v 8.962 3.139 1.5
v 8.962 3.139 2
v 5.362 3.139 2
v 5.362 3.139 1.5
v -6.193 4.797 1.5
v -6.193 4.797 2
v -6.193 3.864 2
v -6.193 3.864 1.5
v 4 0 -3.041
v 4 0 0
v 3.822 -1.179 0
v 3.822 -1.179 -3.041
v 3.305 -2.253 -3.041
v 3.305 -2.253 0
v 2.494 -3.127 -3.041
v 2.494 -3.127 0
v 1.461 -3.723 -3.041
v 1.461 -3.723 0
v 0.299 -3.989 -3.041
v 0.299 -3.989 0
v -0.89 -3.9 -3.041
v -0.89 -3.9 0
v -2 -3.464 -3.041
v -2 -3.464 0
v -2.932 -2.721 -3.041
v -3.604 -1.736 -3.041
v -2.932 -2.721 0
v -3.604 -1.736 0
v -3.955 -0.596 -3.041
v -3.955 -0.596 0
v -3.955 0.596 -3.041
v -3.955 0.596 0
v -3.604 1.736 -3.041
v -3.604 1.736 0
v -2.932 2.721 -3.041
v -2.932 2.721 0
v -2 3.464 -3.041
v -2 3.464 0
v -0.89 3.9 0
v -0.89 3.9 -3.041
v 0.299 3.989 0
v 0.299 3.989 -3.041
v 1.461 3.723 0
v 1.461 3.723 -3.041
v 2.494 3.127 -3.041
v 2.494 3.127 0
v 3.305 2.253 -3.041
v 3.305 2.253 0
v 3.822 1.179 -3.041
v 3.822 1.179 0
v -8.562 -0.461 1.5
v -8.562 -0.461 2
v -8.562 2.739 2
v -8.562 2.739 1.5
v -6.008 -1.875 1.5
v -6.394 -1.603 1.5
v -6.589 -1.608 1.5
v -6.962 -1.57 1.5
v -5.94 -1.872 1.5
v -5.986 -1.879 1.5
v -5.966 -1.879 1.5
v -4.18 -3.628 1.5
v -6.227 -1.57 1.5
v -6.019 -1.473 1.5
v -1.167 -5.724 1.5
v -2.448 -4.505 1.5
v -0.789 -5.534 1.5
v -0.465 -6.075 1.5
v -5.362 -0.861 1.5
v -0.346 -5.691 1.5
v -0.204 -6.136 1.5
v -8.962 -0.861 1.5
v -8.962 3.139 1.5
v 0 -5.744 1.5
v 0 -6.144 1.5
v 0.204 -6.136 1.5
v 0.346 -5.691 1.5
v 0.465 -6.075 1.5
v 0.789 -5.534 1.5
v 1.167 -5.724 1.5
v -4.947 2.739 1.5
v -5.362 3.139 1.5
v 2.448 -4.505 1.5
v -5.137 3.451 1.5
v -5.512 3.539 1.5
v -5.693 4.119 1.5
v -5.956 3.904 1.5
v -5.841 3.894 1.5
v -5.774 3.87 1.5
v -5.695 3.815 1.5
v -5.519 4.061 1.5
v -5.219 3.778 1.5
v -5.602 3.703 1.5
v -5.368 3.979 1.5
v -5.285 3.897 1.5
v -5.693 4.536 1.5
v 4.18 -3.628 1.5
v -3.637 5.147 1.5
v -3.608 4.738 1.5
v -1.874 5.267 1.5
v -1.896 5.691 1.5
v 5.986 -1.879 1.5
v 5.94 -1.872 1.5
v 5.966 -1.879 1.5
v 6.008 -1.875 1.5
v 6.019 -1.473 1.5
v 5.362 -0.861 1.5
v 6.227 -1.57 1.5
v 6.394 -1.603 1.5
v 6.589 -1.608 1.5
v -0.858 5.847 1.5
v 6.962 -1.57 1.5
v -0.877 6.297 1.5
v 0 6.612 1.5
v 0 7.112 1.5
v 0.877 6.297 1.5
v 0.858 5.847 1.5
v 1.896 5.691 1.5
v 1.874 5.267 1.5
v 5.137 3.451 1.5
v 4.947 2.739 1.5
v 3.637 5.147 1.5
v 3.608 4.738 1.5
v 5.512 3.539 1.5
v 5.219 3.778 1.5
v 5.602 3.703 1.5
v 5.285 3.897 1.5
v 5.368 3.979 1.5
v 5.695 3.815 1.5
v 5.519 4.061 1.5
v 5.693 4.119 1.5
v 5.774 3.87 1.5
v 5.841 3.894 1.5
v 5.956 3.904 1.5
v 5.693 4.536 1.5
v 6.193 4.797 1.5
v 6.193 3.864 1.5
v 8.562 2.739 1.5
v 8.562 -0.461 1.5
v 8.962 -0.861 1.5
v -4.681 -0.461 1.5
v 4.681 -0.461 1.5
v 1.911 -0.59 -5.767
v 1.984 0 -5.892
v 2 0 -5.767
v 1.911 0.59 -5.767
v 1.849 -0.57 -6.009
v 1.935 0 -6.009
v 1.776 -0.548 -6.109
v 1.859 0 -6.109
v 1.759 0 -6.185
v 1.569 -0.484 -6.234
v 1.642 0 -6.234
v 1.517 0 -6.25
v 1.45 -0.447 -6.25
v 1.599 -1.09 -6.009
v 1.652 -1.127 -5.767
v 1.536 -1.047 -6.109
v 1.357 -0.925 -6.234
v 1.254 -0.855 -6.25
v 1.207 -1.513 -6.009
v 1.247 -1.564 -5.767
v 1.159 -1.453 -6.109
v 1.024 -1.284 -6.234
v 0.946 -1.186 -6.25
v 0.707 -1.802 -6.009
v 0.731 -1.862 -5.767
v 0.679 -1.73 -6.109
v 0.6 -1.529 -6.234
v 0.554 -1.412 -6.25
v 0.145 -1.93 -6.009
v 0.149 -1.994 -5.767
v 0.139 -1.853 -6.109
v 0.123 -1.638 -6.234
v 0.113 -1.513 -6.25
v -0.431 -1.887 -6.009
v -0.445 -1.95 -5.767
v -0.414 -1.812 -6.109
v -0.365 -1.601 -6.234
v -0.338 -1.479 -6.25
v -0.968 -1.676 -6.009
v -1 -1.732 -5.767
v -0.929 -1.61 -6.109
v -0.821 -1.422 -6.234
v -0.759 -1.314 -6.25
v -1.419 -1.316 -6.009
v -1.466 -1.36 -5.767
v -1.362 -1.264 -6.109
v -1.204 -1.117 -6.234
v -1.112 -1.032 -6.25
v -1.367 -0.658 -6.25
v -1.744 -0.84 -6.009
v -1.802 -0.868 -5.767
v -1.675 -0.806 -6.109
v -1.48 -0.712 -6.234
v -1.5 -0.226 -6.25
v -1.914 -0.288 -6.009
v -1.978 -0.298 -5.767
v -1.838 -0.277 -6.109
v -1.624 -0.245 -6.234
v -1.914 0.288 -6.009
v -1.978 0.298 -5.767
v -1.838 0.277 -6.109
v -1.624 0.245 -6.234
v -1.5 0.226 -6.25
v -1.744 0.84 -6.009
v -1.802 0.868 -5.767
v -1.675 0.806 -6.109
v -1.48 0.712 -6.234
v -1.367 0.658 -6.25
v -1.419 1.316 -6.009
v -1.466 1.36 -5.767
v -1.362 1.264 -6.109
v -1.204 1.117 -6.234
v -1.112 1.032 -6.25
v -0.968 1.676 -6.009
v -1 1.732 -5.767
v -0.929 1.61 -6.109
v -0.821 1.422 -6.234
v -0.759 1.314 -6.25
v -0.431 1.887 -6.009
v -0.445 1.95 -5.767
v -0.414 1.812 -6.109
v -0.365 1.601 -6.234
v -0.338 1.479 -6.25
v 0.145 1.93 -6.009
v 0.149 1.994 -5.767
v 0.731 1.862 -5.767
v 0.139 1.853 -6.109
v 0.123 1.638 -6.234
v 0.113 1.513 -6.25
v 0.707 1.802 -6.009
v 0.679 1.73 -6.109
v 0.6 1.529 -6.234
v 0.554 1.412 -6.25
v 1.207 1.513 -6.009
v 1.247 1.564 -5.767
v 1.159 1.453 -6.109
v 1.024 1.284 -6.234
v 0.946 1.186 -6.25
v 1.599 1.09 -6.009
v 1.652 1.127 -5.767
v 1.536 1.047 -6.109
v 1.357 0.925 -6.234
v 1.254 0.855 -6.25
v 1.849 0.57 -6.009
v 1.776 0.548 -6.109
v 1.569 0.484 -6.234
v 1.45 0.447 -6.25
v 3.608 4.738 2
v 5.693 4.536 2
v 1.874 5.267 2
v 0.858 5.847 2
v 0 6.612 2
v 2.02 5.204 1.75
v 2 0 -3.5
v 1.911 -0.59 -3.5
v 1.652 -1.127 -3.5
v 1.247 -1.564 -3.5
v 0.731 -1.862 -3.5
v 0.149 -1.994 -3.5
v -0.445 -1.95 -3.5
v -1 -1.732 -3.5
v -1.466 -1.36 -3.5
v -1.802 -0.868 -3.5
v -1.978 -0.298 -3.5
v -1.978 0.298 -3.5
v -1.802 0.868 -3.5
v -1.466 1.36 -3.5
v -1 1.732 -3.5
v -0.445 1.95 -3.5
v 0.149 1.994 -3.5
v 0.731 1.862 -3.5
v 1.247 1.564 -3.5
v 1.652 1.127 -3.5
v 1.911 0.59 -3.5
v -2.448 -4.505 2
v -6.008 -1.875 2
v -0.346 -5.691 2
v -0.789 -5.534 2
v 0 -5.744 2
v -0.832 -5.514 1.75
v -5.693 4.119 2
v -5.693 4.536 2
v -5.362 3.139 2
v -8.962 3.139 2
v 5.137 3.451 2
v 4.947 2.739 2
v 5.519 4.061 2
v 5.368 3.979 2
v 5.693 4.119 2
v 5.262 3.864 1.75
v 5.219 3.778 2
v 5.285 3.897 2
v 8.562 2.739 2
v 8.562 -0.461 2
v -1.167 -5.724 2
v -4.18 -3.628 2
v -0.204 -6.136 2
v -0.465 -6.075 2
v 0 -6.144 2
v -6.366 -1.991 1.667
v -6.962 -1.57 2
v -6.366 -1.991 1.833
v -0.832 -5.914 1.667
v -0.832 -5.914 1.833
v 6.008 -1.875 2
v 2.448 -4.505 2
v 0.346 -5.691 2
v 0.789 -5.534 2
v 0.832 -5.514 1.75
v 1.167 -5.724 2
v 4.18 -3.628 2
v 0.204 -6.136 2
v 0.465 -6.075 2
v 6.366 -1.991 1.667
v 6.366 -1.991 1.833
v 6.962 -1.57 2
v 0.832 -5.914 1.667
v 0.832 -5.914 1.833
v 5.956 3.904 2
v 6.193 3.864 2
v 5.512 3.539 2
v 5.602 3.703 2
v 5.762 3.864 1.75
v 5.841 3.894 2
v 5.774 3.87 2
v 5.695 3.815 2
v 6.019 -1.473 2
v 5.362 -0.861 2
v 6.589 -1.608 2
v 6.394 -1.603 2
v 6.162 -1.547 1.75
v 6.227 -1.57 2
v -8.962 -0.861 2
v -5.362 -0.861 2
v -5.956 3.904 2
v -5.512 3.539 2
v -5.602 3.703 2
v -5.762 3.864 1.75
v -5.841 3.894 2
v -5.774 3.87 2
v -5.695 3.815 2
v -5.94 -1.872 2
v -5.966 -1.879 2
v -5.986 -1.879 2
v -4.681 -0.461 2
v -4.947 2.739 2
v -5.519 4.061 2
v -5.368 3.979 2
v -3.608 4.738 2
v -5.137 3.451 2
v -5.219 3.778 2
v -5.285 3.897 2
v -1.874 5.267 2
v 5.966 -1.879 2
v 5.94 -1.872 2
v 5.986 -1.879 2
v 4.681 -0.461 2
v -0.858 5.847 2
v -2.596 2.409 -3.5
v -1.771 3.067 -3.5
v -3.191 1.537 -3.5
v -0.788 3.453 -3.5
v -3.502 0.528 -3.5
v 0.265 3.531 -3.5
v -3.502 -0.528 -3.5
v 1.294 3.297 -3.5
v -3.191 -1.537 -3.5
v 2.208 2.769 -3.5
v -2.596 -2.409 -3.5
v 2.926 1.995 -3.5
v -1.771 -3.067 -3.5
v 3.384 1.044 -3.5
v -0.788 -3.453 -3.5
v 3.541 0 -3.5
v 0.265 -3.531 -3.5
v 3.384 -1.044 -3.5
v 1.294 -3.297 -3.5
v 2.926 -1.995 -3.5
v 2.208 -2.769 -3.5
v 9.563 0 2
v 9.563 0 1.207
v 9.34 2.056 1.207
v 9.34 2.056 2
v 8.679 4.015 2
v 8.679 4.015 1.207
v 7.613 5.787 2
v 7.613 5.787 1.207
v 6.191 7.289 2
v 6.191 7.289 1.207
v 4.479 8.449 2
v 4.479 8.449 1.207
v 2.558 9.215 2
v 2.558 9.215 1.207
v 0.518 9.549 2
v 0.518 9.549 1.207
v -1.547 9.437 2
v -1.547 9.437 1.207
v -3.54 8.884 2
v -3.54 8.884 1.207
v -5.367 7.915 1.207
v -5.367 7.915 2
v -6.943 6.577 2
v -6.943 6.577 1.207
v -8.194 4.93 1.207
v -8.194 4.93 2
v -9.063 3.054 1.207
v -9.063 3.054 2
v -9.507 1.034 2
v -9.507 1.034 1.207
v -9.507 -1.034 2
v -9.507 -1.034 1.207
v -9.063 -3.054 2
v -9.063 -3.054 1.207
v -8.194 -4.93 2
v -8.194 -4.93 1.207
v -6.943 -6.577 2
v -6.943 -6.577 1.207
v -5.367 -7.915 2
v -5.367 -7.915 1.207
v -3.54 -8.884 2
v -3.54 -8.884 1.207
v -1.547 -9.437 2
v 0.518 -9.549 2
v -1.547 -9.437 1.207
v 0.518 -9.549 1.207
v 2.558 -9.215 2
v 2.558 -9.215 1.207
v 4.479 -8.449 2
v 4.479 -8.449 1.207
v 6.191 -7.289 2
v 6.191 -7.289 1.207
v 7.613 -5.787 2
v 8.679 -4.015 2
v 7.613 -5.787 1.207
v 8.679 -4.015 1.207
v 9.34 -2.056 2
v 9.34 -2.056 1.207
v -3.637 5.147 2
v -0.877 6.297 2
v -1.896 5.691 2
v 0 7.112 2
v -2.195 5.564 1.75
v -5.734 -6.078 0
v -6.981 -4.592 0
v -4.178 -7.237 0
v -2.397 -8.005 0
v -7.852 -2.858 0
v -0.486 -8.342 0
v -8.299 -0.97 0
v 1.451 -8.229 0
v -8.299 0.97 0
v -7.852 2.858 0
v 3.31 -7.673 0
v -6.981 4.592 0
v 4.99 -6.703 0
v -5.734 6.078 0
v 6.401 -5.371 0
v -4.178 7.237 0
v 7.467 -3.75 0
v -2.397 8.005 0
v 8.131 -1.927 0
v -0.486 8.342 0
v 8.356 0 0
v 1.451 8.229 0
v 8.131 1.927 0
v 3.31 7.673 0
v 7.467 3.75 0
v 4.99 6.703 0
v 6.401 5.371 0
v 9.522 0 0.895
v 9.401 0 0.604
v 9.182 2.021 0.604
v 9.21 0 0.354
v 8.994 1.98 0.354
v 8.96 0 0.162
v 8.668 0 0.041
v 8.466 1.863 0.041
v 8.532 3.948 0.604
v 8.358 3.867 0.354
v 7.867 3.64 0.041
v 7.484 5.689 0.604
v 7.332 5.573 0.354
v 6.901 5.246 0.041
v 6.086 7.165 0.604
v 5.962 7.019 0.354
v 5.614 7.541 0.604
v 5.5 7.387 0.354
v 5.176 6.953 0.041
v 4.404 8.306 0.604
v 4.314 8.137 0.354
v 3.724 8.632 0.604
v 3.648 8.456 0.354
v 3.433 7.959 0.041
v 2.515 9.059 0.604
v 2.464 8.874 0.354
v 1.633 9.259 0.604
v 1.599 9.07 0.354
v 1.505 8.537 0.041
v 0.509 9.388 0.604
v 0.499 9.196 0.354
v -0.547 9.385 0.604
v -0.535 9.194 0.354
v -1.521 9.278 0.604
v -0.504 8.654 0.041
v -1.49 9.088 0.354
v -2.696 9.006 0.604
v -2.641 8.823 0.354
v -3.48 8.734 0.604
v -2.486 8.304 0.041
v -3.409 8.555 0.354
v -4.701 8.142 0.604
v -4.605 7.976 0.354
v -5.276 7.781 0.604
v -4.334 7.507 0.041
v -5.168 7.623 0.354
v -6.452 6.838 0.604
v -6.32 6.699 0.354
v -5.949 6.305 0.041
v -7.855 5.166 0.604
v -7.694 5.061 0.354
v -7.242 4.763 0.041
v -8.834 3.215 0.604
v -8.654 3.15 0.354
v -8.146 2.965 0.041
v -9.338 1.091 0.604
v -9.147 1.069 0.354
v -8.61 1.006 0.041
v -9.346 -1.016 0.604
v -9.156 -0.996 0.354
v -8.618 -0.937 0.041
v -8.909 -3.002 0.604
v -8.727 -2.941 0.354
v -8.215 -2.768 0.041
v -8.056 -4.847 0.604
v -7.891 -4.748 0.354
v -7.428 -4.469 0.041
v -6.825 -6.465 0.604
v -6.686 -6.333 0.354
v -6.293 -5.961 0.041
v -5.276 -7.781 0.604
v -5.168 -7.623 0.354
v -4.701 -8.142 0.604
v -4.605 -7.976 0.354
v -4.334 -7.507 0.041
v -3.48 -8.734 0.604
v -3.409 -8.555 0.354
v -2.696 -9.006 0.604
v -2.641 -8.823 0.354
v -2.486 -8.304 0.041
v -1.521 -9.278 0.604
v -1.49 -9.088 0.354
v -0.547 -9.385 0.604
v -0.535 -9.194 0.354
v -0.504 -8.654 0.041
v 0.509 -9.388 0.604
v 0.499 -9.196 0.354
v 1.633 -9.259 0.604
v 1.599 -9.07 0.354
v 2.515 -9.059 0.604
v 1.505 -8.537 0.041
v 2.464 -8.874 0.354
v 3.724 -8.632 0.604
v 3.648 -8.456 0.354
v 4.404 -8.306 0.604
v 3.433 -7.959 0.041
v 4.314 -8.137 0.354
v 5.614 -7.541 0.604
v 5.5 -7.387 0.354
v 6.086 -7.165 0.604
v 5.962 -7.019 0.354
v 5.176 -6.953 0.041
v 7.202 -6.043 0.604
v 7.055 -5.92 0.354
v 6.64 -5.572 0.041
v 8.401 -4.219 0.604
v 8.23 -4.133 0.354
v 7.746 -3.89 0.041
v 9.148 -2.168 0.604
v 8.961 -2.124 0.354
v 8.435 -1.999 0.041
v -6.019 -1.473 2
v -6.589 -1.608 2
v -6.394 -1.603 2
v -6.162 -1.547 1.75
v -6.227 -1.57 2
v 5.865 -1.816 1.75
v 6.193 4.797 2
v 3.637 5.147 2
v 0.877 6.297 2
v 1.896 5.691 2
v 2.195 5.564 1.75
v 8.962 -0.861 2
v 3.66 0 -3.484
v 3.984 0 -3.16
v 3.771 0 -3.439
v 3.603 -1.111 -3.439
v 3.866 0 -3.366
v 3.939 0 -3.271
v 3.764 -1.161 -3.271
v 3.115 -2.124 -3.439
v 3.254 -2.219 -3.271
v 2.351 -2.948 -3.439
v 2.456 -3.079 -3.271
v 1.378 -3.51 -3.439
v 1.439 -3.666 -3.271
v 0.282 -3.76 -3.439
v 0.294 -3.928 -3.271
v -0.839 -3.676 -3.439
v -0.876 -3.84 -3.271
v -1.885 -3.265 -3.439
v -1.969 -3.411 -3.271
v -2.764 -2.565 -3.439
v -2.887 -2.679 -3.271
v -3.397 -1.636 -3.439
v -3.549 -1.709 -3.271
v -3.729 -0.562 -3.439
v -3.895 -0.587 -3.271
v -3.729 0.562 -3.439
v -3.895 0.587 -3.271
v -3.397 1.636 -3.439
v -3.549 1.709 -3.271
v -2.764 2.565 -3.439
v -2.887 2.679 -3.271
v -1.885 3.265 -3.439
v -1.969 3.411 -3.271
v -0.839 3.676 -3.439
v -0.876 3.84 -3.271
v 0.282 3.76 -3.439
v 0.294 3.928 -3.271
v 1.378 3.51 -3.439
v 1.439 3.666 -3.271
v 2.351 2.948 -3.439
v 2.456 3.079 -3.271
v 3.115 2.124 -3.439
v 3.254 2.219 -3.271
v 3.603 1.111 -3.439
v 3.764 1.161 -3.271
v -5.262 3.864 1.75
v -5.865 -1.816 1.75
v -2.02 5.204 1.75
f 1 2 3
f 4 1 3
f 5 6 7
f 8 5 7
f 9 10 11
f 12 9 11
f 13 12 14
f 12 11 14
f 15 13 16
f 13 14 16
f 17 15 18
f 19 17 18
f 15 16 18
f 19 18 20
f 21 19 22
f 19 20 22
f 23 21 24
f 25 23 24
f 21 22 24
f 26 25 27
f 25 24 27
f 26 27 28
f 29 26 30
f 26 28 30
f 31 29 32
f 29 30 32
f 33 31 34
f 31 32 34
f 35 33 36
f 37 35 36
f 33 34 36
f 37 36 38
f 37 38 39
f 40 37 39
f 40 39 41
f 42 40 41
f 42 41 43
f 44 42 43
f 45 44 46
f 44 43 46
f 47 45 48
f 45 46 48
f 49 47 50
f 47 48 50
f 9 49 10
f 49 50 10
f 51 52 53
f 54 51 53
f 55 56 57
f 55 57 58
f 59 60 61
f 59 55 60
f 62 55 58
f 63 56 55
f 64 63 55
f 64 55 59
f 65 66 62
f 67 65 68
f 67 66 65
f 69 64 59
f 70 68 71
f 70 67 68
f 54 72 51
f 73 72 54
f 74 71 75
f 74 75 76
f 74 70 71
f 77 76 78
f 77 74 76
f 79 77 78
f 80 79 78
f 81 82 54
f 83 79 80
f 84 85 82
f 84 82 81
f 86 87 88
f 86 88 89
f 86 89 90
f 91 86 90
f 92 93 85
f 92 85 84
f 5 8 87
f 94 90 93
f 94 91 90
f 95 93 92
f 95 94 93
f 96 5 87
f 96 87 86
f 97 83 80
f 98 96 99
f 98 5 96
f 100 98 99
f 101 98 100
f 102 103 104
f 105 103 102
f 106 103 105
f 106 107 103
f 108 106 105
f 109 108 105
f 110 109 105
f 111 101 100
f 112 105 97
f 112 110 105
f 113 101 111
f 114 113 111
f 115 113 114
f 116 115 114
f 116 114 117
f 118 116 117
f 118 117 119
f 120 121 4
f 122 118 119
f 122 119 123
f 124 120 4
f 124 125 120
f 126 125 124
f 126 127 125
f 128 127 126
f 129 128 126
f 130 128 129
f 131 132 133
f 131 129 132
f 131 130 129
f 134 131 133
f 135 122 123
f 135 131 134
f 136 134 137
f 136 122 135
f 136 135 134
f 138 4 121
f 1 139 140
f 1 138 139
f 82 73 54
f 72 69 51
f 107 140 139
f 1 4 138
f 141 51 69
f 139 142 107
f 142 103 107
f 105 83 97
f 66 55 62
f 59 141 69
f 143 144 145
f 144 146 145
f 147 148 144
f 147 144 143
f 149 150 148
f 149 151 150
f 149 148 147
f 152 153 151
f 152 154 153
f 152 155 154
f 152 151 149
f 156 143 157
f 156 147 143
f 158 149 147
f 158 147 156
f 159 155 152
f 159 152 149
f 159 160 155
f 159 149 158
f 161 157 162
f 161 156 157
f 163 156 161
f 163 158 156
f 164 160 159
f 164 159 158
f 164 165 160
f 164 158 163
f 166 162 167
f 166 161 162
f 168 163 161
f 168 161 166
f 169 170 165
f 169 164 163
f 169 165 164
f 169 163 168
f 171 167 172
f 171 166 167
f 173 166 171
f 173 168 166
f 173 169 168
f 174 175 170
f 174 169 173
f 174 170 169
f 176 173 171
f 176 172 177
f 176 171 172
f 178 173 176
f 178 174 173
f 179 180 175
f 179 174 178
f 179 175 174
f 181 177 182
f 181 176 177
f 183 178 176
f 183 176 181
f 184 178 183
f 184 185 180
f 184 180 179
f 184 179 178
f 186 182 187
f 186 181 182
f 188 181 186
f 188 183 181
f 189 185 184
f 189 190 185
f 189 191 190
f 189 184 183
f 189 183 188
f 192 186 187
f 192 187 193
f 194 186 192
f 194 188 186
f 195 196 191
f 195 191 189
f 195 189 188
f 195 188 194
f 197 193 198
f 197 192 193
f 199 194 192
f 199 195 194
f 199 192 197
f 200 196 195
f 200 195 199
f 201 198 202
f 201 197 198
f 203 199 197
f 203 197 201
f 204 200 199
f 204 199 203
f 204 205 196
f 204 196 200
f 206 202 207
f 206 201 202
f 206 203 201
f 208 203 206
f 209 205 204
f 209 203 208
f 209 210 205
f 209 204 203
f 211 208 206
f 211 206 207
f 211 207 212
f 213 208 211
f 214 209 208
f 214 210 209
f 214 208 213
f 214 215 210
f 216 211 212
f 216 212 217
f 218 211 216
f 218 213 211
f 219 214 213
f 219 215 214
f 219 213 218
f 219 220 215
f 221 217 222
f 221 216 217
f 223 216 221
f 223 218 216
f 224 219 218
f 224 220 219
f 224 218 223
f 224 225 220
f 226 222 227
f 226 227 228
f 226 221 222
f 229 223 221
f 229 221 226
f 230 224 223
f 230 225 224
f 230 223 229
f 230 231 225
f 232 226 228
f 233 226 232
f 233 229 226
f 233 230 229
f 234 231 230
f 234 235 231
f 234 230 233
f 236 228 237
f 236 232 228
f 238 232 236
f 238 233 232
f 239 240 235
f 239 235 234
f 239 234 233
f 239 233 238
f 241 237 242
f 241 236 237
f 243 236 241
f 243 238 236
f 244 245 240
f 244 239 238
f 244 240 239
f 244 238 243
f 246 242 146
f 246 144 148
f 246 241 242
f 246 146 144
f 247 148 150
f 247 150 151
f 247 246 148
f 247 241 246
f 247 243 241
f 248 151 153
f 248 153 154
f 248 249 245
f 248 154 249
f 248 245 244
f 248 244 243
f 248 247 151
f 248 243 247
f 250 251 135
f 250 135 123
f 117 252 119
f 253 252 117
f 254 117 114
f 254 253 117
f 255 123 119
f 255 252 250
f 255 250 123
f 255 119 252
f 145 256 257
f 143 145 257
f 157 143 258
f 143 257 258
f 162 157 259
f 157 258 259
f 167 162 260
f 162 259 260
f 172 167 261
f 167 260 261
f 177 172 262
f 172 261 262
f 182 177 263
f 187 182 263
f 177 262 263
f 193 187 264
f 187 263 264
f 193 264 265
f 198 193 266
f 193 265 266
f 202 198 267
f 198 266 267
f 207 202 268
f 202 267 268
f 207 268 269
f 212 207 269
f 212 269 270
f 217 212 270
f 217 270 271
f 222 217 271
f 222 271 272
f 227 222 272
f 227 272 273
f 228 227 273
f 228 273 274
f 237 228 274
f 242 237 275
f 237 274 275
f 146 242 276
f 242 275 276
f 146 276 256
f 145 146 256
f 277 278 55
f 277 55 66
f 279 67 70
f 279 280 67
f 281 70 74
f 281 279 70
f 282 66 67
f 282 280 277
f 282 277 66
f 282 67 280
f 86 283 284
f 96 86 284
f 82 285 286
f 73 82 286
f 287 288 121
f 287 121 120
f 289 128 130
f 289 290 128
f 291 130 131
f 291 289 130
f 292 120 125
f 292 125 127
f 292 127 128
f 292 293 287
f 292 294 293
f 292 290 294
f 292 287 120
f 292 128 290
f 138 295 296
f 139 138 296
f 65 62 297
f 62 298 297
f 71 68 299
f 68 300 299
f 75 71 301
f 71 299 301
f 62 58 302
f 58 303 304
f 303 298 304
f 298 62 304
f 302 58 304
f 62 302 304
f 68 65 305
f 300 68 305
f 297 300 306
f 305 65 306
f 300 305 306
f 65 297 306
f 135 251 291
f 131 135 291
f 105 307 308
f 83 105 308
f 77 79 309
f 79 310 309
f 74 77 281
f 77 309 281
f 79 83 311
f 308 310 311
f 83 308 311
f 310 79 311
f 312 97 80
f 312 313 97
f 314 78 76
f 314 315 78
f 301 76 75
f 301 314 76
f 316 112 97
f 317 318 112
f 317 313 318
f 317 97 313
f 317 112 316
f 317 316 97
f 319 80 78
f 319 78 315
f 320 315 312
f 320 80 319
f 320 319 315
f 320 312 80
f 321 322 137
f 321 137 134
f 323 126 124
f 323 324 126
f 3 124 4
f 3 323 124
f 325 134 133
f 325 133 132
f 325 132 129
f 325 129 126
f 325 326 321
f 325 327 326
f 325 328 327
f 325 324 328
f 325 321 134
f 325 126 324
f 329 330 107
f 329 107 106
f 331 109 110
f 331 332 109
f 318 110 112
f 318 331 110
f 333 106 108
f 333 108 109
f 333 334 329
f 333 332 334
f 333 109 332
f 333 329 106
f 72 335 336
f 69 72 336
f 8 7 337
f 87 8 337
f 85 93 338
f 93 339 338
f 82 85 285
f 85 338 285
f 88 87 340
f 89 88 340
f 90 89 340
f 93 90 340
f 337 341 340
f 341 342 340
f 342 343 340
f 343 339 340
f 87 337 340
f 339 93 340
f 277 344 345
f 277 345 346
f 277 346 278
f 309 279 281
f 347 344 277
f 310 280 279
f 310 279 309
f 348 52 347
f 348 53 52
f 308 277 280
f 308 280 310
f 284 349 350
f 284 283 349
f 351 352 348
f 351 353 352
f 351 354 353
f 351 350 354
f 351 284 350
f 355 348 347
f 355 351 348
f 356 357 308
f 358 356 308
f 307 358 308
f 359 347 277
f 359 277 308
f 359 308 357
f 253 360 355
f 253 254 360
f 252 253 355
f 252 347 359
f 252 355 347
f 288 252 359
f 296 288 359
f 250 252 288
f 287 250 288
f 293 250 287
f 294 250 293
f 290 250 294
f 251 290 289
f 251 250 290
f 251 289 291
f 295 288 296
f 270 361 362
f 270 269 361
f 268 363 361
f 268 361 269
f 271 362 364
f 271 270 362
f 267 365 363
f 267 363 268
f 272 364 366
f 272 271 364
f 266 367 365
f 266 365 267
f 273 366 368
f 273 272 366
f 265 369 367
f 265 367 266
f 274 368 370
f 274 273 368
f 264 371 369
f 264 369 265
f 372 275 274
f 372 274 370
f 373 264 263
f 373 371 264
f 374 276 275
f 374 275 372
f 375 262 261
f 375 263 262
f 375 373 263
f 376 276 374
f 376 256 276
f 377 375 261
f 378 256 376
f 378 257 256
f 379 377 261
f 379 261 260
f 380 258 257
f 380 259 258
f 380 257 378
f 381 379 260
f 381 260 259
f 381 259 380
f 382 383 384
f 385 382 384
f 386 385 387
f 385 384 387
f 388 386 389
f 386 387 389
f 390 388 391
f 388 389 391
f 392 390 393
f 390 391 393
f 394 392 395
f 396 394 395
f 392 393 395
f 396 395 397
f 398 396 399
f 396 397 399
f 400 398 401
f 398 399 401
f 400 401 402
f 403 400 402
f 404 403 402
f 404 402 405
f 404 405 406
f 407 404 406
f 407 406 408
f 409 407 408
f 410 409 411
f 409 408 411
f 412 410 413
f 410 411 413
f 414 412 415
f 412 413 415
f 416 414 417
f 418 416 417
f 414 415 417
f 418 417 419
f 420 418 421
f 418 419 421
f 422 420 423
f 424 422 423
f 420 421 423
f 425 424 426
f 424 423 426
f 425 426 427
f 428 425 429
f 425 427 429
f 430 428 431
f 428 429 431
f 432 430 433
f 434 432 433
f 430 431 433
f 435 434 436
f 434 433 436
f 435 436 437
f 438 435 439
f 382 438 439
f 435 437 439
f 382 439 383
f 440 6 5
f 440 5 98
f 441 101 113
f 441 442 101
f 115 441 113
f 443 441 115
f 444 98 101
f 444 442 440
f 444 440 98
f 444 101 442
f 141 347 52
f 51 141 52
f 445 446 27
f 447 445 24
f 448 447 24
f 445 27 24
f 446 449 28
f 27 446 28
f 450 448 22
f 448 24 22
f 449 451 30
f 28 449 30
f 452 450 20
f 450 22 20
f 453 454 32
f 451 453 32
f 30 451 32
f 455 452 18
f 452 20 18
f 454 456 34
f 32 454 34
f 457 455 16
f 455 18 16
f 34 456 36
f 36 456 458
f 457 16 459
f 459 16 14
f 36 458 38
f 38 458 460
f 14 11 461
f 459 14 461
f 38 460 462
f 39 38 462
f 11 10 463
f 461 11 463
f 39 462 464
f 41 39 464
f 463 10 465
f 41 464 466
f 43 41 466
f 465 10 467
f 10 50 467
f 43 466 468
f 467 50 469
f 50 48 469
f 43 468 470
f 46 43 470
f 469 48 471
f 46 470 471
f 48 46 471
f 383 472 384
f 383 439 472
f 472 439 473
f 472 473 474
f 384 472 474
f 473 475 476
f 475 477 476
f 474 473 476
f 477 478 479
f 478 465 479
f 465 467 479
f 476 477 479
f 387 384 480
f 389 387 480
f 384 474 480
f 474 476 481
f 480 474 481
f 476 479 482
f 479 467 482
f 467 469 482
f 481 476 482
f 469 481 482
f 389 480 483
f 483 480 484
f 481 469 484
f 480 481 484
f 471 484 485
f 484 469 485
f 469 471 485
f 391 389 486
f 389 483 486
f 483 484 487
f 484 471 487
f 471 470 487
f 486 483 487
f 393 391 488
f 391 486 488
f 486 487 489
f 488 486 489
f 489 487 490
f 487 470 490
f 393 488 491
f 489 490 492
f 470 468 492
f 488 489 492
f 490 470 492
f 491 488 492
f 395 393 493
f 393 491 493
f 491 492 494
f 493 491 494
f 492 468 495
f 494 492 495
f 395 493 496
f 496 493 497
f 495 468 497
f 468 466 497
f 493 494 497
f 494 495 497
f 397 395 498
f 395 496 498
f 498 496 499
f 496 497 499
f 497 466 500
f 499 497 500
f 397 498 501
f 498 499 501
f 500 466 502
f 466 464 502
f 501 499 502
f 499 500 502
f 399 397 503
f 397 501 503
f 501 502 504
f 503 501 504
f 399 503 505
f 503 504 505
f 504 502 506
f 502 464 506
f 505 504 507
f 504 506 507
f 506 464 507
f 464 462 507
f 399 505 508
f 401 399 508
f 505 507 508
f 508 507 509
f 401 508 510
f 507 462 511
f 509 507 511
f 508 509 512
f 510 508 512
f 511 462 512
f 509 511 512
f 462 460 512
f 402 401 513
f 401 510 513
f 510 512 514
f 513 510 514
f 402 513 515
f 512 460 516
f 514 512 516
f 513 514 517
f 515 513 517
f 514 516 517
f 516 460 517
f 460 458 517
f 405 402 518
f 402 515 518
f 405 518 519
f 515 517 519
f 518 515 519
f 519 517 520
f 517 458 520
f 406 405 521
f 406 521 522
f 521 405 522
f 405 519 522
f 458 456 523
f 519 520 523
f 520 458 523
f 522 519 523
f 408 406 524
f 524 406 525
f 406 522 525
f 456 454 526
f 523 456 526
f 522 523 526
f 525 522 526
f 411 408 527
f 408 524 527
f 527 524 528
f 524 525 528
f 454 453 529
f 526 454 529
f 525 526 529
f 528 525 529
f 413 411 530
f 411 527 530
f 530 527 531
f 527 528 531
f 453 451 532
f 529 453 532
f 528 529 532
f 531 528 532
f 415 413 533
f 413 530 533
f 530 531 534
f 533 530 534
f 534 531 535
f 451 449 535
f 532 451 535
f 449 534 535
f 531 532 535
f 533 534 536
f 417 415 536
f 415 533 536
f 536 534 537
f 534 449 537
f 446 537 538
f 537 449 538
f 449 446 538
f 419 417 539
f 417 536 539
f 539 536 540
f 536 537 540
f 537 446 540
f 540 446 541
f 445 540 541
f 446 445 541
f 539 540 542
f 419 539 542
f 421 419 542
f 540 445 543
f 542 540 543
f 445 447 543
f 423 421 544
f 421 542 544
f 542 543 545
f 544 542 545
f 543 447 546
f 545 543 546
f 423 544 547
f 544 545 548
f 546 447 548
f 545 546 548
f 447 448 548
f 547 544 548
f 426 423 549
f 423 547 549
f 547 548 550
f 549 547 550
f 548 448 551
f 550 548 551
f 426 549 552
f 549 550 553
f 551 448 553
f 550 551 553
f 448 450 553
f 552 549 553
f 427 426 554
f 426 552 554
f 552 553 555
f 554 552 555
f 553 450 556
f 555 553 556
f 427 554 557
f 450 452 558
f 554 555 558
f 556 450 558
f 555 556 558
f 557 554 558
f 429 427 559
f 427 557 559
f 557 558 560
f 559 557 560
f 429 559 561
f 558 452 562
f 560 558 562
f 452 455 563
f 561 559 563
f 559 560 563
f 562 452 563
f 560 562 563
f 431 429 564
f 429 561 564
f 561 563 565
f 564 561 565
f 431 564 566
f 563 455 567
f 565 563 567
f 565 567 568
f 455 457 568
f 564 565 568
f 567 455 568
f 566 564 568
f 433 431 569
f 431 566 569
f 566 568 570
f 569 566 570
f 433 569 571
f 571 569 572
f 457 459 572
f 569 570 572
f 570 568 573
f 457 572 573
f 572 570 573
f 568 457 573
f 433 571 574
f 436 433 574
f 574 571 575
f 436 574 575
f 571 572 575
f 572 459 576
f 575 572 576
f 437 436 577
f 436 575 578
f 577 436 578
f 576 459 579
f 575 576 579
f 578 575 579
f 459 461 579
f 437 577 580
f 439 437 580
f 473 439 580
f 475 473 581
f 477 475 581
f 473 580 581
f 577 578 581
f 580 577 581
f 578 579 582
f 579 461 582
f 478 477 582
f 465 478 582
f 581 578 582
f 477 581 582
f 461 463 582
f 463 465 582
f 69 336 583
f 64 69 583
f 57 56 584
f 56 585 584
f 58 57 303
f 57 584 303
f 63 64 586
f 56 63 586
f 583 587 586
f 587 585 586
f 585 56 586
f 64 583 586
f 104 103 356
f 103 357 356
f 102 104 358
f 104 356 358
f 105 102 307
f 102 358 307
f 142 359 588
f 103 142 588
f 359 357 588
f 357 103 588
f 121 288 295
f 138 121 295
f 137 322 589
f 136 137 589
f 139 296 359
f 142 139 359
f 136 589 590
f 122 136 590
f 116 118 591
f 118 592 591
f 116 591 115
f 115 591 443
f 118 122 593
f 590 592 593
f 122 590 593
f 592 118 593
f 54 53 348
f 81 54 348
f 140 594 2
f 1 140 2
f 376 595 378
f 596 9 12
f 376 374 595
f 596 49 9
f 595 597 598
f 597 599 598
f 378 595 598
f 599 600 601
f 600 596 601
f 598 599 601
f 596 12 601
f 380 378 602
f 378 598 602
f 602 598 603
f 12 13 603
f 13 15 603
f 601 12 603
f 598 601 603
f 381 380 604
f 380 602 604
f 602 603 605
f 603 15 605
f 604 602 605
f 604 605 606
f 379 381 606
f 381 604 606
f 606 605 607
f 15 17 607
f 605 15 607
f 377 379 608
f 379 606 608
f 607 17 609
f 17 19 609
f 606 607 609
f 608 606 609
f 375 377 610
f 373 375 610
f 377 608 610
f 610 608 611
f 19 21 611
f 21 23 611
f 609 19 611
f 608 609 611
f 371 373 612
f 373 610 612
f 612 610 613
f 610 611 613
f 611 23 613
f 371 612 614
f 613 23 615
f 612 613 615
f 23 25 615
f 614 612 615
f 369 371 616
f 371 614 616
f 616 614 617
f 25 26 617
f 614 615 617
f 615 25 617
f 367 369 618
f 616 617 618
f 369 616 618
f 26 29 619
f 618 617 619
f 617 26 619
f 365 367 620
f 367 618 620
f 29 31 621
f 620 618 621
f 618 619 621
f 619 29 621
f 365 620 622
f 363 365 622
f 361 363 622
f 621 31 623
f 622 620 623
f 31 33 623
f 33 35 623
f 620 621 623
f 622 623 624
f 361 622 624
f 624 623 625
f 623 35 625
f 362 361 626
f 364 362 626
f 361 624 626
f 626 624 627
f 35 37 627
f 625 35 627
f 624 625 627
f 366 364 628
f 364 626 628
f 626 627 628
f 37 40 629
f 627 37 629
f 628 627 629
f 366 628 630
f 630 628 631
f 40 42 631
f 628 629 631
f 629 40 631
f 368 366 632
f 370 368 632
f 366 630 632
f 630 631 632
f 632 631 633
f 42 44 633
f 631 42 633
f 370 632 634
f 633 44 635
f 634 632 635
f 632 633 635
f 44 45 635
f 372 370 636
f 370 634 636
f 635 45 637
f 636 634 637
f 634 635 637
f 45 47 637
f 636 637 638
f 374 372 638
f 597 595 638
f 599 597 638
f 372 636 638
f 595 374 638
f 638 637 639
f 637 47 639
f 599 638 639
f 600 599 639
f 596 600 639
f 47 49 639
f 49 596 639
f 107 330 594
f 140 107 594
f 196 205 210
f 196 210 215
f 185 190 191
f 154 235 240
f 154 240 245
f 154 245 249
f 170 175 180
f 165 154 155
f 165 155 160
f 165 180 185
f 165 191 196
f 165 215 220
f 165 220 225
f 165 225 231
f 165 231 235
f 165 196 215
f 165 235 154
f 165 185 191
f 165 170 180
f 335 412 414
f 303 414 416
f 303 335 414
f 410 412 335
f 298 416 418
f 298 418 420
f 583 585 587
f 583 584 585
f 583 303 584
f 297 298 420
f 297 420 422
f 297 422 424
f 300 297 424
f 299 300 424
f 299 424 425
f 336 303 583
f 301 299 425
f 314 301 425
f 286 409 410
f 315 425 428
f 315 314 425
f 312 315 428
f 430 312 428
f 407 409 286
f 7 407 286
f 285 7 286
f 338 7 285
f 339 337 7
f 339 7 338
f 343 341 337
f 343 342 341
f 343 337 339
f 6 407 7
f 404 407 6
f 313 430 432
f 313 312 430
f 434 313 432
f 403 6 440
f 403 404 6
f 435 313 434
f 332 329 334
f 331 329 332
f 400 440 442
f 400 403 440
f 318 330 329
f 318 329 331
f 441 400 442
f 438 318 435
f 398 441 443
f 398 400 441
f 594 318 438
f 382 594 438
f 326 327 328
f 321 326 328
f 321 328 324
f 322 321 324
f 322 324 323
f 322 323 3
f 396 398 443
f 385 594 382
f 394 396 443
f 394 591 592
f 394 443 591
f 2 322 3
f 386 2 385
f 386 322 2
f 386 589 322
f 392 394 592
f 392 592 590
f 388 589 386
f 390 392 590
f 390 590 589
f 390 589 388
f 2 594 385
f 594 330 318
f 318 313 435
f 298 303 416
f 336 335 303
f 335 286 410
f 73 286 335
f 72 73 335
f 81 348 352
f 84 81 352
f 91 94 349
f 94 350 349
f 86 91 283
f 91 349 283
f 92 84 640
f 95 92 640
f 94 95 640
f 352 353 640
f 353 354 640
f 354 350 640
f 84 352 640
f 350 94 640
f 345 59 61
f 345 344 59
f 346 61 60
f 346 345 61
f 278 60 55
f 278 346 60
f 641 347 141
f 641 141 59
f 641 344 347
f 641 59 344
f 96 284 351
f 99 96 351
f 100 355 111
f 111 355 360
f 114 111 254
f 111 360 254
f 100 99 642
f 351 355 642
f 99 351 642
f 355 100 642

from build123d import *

# Parameters (mm, degrees)
F0_R     = 9.5631
F1_DEPTH = 2
F3_DEPTH = 0.5
F4_R     = 4
F5_DEPTH = 3.5
F6_R     = 1.2071067812
F7_R     = 2
F8_DEPTH = 2.75
F9_R     = 0.4828427125
F10_R    = 0.4587005769


with BuildPart() as f1:
    # F0 (on Top) → F1 (new body)
    with BuildSketch(Plane.XY):
        Circle(F0_R)
    extrude(amount=F1_DEPTH)

    # F2 (on face) → F3 (cut)
    with BuildSketch(Plane.XY.offset(2)):
        with BuildLine():
            Line((-5.3615504412, 3.1385514695), (-8.9615506499, 3.1385514695))
            Line((-8.9615506499, 3.1385514695), (-8.9615506499, -0.8614485305))
            Line((-8.9615506499, -0.8614485305), (-5.3615504412, -0.8614485305))
            add(Edge.make_bspline(
                [(-5.3615504412, -0.8614485305), (-5.6224469921, -1.1192503233), (-6.0925433919, -1.7012989472), (-6.6913880247, -1.6026951337), (-6.9615501282, -1.56970984)],
                knots=[0, 0, 0, 0, 0.5343034202, 1, 1, 1, 1], degree=3))
            add(Edge.make_bspline(
                [(-6.9615501282, -1.56970984), (-6.8399805695, -1.6500440597), (-6.347646398, -1.9753827537), (-0.9303625125, -6.1475392154), (-0.1936655889, -6.144593355), (0, -6.1438189364)],
                knots=[0, 0, 0, 0, 0.1946474203, 0.7882859605, 1, 1, 1, 1], degree=3))
            add(Edge.make_bspline(
                [(6.9615501282, -1.56970984), (6.8399805695, -1.6500440597), (6.347646398, -1.9753827537), (0.9303625125, -6.1475392154), (0.1936655889, -6.144593355), (0, -6.1438189364)],
                knots=[0, 0, 0, 0, 0.1946474203, 0.7882859605, 1, 1, 1, 1], degree=3))
            add(Edge.make_bspline(
                [(5.3615504412, -0.8614485305), (5.6224469921, -1.1192503233), (6.0925433919, -1.7012989472), (6.6913880247, -1.6026951337), (6.9615501282, -1.56970984)],
                knots=[0, 0, 0, 0, 0.5343034202, 1, 1, 1, 1], degree=3))
            Line((5.3615504412, -0.8614485305), (8.9615506499, -0.8614485305))
            Line((8.9615506499, -0.8614485305), (8.9615506499, 3.1385514695))
            Line((8.9615506499, 3.1385514695), (5.3615504412, 3.1385514695))
            add(Edge.make_bspline(
                [(6.1931497529, 3.8636233108), (6.0443974333, 3.9010068061), (5.670325539, 3.978226764), (5.4715862757, 3.474410976), (5.3615504412, 3.1385514695)],
                knots=[0, 0, 0, 0, 0.4192603681, 1, 1, 1, 1], degree=3))
            Line((6.1931497529, 3.8636233108), (6.1931497529, 4.7969568528))
            add(Edge.make_bspline(
                [(6.1931497529, 4.7969568528), (4.7216724548, 4.9242823231), (2.1318591256, 5.3009462593), (0.6299616116, 6.4122477435), (0, 7.1124638543)],
                knots=[0, 0, 0, 0, 0.5517805711, 1, 1, 1, 1], degree=3))
            add(Edge.make_bspline(
                [(-6.1931497529, 4.7969568528), (-4.7216724548, 4.9242823231), (-2.1318591256, 5.3009462593), (-0.6299616116, 6.4122477435), (0, 7.1124638543)],
                knots=[0, 0, 0, 0, 0.5517805711, 1, 1, 1, 1], degree=3))
            Line((-6.1931497529, 4.7969568528), (-6.1931497529, 3.8636233108))
            add(Edge.make_bspline(
                [(-6.1931497529, 3.8636233108), (-6.0443974333, 3.9010068061), (-5.670325539, 3.978226764), (-5.4715862757, 3.474410976), (-5.3615504412, 3.1385514695)],
                knots=[0, 0, 0, 0, 0.4192603681, 1, 1, 1, 1], degree=3))
        make_face()
        with BuildLine():
            Line((-8.5615506499, -0.4614485305), (-8.5615506499, 2.7385514695))
            Line((-8.5615506499, 2.7385514695), (-4.9470122904, 2.7385514695))
            add(Edge.make_bspline(
                [(-4.9470122904, 2.7385514695), (-5.1446386525, 3.2045990564), (-5.1055478765, 3.9237810781), (-5.5161688277, 4.0677103042), (-5.6931497529, 4.1190395132)],
                knots=[0, 0, 0, 0, 0.6041530811, 1, 1, 1, 1], degree=3))
            Line((-5.6931497529, 4.1190395132), (-5.6931497529, 4.5363726094))
            add(Edge.make_bspline(
                [(-5.6931497529, 4.5363726094), (-4.2737453772, 4.5524962856), (-1.9984707056, 4.9805333611), (-0.5673266444, 5.9968670056), (0, 6.6124638543)],
                knots=[0, 0, 0, 0, 0.5518625842, 1, 1, 1, 1], degree=3))
            add(Edge.make_bspline(
                [(5.6931497529, 4.5363726094), (4.2737453772, 4.5524962856), (1.9984707056, 4.9805333611), (0.5673266444, 5.9968670056), (0, 6.6124638543)],
                knots=[0, 0, 0, 0, 0.5518625842, 1, 1, 1, 1], degree=3))
            Line((5.6931497529, 4.5363726094), (5.6931497529, 4.1190395132))
            add(Edge.make_bspline(
                [(4.9470122904, 2.7385514695), (5.1446386525, 3.2045990564), (5.1055478765, 3.9237810781), (5.5161688277, 4.0677103042), (5.6931497529, 4.1190395132)],
                knots=[0, 0, 0, 0, 0.6041530811, 1, 1, 1, 1], degree=3))
            Line((4.9470122904, 2.7385514695), (8.5615506499, 2.7385514695))
            Line((8.5615506499, 2.7385514695), (8.5615506499, -0.4614485305))
            Line((8.5615506499, -0.4614485305), (4.6812822111, -0.4614485305))
            add(Edge.make_bspline(
                [(4.6812822111, -0.4614485305), (5.1399033686, -1.0753765004), (5.8187100584, -1.7971304682), (5.9548754674, -1.8901632532), (6.0075321235, -1.8750670133)],
                knots=[0, 0, 0, 0, 0.7736948108, 1, 1, 1, 1], degree=3))
            add(Edge.make_bspline(
                [(6.0075321235, -1.8750670133), (3.9265038862, -3.4407765932), (1.0763673429, -5.6147060905), (0.2287364416, -5.721853651), (0, -5.7438189364)],
                knots=[0, 0, 0, 0, 0.7303059463, 1, 1, 1, 1], degree=3))
            add(Edge.make_bspline(
                [(-6.0075321235, -1.8750670133), (-3.9265038862, -3.4407765932), (-1.0763673429, -5.6147060905), (-0.2287364416, -5.721853651), (0, -5.7438189364)],
                knots=[0, 0, 0, 0, 0.7303059463, 1, 1, 1, 1], degree=3))
            add(Edge.make_bspline(
                [(-4.6812822111, -0.4614485305), (-5.1399033686, -1.0753765004), (-5.8187100584, -1.7971304682), (-5.9548754674, -1.8901632532), (-6.0075321235, -1.8750670133)],
                knots=[0, 0, 0, 0, 0.7736948108, 1, 1, 1, 1], degree=3))
            Line((-4.6812822111, -0.4614485305), (-8.5615506499, -0.4614485305))
        make_face(mode=Mode.SUBTRACT)
    extrude(amount=-F3_DEPTH, mode=Mode.SUBTRACT)

    # F4 (on face) → F5 (join)
    with BuildSketch(Plane(origin=(0, 0, 0), x_dir=(1, 0, 0), z_dir=(0, 0, -1))):
        Circle(F4_R)
    extrude(amount=F5_DEPTH)

    # F6
    f6_edges = [f1.edges().sort_by_distance(p)[0] for p in [
        (-9.5631, 0, 0),
    ]]
    fillet(f6_edges, radius=F6_R)

    # F7 (on face) → F8 (join)
    with BuildSketch(Plane(origin=(0, 0, -3.5), x_dir=(1, 0, 0), z_dir=(0, 0, -1))):
        Circle(F7_R)
    extrude(amount=F8_DEPTH)

    # F9
    f9_edges = [f1.edges().sort_by_distance(p)[0] for p in [
        (-2, 0, -6.25),
    ]]
    fillet(f9_edges, radius=F9_R)

    # F10
    f10_edges = [f1.edges().sort_by_distance(p)[0] for p in [
        (-4, 0, -3.5),
    ]]
    fillet(f10_edges, radius=F10_R)


solid = f1.part
